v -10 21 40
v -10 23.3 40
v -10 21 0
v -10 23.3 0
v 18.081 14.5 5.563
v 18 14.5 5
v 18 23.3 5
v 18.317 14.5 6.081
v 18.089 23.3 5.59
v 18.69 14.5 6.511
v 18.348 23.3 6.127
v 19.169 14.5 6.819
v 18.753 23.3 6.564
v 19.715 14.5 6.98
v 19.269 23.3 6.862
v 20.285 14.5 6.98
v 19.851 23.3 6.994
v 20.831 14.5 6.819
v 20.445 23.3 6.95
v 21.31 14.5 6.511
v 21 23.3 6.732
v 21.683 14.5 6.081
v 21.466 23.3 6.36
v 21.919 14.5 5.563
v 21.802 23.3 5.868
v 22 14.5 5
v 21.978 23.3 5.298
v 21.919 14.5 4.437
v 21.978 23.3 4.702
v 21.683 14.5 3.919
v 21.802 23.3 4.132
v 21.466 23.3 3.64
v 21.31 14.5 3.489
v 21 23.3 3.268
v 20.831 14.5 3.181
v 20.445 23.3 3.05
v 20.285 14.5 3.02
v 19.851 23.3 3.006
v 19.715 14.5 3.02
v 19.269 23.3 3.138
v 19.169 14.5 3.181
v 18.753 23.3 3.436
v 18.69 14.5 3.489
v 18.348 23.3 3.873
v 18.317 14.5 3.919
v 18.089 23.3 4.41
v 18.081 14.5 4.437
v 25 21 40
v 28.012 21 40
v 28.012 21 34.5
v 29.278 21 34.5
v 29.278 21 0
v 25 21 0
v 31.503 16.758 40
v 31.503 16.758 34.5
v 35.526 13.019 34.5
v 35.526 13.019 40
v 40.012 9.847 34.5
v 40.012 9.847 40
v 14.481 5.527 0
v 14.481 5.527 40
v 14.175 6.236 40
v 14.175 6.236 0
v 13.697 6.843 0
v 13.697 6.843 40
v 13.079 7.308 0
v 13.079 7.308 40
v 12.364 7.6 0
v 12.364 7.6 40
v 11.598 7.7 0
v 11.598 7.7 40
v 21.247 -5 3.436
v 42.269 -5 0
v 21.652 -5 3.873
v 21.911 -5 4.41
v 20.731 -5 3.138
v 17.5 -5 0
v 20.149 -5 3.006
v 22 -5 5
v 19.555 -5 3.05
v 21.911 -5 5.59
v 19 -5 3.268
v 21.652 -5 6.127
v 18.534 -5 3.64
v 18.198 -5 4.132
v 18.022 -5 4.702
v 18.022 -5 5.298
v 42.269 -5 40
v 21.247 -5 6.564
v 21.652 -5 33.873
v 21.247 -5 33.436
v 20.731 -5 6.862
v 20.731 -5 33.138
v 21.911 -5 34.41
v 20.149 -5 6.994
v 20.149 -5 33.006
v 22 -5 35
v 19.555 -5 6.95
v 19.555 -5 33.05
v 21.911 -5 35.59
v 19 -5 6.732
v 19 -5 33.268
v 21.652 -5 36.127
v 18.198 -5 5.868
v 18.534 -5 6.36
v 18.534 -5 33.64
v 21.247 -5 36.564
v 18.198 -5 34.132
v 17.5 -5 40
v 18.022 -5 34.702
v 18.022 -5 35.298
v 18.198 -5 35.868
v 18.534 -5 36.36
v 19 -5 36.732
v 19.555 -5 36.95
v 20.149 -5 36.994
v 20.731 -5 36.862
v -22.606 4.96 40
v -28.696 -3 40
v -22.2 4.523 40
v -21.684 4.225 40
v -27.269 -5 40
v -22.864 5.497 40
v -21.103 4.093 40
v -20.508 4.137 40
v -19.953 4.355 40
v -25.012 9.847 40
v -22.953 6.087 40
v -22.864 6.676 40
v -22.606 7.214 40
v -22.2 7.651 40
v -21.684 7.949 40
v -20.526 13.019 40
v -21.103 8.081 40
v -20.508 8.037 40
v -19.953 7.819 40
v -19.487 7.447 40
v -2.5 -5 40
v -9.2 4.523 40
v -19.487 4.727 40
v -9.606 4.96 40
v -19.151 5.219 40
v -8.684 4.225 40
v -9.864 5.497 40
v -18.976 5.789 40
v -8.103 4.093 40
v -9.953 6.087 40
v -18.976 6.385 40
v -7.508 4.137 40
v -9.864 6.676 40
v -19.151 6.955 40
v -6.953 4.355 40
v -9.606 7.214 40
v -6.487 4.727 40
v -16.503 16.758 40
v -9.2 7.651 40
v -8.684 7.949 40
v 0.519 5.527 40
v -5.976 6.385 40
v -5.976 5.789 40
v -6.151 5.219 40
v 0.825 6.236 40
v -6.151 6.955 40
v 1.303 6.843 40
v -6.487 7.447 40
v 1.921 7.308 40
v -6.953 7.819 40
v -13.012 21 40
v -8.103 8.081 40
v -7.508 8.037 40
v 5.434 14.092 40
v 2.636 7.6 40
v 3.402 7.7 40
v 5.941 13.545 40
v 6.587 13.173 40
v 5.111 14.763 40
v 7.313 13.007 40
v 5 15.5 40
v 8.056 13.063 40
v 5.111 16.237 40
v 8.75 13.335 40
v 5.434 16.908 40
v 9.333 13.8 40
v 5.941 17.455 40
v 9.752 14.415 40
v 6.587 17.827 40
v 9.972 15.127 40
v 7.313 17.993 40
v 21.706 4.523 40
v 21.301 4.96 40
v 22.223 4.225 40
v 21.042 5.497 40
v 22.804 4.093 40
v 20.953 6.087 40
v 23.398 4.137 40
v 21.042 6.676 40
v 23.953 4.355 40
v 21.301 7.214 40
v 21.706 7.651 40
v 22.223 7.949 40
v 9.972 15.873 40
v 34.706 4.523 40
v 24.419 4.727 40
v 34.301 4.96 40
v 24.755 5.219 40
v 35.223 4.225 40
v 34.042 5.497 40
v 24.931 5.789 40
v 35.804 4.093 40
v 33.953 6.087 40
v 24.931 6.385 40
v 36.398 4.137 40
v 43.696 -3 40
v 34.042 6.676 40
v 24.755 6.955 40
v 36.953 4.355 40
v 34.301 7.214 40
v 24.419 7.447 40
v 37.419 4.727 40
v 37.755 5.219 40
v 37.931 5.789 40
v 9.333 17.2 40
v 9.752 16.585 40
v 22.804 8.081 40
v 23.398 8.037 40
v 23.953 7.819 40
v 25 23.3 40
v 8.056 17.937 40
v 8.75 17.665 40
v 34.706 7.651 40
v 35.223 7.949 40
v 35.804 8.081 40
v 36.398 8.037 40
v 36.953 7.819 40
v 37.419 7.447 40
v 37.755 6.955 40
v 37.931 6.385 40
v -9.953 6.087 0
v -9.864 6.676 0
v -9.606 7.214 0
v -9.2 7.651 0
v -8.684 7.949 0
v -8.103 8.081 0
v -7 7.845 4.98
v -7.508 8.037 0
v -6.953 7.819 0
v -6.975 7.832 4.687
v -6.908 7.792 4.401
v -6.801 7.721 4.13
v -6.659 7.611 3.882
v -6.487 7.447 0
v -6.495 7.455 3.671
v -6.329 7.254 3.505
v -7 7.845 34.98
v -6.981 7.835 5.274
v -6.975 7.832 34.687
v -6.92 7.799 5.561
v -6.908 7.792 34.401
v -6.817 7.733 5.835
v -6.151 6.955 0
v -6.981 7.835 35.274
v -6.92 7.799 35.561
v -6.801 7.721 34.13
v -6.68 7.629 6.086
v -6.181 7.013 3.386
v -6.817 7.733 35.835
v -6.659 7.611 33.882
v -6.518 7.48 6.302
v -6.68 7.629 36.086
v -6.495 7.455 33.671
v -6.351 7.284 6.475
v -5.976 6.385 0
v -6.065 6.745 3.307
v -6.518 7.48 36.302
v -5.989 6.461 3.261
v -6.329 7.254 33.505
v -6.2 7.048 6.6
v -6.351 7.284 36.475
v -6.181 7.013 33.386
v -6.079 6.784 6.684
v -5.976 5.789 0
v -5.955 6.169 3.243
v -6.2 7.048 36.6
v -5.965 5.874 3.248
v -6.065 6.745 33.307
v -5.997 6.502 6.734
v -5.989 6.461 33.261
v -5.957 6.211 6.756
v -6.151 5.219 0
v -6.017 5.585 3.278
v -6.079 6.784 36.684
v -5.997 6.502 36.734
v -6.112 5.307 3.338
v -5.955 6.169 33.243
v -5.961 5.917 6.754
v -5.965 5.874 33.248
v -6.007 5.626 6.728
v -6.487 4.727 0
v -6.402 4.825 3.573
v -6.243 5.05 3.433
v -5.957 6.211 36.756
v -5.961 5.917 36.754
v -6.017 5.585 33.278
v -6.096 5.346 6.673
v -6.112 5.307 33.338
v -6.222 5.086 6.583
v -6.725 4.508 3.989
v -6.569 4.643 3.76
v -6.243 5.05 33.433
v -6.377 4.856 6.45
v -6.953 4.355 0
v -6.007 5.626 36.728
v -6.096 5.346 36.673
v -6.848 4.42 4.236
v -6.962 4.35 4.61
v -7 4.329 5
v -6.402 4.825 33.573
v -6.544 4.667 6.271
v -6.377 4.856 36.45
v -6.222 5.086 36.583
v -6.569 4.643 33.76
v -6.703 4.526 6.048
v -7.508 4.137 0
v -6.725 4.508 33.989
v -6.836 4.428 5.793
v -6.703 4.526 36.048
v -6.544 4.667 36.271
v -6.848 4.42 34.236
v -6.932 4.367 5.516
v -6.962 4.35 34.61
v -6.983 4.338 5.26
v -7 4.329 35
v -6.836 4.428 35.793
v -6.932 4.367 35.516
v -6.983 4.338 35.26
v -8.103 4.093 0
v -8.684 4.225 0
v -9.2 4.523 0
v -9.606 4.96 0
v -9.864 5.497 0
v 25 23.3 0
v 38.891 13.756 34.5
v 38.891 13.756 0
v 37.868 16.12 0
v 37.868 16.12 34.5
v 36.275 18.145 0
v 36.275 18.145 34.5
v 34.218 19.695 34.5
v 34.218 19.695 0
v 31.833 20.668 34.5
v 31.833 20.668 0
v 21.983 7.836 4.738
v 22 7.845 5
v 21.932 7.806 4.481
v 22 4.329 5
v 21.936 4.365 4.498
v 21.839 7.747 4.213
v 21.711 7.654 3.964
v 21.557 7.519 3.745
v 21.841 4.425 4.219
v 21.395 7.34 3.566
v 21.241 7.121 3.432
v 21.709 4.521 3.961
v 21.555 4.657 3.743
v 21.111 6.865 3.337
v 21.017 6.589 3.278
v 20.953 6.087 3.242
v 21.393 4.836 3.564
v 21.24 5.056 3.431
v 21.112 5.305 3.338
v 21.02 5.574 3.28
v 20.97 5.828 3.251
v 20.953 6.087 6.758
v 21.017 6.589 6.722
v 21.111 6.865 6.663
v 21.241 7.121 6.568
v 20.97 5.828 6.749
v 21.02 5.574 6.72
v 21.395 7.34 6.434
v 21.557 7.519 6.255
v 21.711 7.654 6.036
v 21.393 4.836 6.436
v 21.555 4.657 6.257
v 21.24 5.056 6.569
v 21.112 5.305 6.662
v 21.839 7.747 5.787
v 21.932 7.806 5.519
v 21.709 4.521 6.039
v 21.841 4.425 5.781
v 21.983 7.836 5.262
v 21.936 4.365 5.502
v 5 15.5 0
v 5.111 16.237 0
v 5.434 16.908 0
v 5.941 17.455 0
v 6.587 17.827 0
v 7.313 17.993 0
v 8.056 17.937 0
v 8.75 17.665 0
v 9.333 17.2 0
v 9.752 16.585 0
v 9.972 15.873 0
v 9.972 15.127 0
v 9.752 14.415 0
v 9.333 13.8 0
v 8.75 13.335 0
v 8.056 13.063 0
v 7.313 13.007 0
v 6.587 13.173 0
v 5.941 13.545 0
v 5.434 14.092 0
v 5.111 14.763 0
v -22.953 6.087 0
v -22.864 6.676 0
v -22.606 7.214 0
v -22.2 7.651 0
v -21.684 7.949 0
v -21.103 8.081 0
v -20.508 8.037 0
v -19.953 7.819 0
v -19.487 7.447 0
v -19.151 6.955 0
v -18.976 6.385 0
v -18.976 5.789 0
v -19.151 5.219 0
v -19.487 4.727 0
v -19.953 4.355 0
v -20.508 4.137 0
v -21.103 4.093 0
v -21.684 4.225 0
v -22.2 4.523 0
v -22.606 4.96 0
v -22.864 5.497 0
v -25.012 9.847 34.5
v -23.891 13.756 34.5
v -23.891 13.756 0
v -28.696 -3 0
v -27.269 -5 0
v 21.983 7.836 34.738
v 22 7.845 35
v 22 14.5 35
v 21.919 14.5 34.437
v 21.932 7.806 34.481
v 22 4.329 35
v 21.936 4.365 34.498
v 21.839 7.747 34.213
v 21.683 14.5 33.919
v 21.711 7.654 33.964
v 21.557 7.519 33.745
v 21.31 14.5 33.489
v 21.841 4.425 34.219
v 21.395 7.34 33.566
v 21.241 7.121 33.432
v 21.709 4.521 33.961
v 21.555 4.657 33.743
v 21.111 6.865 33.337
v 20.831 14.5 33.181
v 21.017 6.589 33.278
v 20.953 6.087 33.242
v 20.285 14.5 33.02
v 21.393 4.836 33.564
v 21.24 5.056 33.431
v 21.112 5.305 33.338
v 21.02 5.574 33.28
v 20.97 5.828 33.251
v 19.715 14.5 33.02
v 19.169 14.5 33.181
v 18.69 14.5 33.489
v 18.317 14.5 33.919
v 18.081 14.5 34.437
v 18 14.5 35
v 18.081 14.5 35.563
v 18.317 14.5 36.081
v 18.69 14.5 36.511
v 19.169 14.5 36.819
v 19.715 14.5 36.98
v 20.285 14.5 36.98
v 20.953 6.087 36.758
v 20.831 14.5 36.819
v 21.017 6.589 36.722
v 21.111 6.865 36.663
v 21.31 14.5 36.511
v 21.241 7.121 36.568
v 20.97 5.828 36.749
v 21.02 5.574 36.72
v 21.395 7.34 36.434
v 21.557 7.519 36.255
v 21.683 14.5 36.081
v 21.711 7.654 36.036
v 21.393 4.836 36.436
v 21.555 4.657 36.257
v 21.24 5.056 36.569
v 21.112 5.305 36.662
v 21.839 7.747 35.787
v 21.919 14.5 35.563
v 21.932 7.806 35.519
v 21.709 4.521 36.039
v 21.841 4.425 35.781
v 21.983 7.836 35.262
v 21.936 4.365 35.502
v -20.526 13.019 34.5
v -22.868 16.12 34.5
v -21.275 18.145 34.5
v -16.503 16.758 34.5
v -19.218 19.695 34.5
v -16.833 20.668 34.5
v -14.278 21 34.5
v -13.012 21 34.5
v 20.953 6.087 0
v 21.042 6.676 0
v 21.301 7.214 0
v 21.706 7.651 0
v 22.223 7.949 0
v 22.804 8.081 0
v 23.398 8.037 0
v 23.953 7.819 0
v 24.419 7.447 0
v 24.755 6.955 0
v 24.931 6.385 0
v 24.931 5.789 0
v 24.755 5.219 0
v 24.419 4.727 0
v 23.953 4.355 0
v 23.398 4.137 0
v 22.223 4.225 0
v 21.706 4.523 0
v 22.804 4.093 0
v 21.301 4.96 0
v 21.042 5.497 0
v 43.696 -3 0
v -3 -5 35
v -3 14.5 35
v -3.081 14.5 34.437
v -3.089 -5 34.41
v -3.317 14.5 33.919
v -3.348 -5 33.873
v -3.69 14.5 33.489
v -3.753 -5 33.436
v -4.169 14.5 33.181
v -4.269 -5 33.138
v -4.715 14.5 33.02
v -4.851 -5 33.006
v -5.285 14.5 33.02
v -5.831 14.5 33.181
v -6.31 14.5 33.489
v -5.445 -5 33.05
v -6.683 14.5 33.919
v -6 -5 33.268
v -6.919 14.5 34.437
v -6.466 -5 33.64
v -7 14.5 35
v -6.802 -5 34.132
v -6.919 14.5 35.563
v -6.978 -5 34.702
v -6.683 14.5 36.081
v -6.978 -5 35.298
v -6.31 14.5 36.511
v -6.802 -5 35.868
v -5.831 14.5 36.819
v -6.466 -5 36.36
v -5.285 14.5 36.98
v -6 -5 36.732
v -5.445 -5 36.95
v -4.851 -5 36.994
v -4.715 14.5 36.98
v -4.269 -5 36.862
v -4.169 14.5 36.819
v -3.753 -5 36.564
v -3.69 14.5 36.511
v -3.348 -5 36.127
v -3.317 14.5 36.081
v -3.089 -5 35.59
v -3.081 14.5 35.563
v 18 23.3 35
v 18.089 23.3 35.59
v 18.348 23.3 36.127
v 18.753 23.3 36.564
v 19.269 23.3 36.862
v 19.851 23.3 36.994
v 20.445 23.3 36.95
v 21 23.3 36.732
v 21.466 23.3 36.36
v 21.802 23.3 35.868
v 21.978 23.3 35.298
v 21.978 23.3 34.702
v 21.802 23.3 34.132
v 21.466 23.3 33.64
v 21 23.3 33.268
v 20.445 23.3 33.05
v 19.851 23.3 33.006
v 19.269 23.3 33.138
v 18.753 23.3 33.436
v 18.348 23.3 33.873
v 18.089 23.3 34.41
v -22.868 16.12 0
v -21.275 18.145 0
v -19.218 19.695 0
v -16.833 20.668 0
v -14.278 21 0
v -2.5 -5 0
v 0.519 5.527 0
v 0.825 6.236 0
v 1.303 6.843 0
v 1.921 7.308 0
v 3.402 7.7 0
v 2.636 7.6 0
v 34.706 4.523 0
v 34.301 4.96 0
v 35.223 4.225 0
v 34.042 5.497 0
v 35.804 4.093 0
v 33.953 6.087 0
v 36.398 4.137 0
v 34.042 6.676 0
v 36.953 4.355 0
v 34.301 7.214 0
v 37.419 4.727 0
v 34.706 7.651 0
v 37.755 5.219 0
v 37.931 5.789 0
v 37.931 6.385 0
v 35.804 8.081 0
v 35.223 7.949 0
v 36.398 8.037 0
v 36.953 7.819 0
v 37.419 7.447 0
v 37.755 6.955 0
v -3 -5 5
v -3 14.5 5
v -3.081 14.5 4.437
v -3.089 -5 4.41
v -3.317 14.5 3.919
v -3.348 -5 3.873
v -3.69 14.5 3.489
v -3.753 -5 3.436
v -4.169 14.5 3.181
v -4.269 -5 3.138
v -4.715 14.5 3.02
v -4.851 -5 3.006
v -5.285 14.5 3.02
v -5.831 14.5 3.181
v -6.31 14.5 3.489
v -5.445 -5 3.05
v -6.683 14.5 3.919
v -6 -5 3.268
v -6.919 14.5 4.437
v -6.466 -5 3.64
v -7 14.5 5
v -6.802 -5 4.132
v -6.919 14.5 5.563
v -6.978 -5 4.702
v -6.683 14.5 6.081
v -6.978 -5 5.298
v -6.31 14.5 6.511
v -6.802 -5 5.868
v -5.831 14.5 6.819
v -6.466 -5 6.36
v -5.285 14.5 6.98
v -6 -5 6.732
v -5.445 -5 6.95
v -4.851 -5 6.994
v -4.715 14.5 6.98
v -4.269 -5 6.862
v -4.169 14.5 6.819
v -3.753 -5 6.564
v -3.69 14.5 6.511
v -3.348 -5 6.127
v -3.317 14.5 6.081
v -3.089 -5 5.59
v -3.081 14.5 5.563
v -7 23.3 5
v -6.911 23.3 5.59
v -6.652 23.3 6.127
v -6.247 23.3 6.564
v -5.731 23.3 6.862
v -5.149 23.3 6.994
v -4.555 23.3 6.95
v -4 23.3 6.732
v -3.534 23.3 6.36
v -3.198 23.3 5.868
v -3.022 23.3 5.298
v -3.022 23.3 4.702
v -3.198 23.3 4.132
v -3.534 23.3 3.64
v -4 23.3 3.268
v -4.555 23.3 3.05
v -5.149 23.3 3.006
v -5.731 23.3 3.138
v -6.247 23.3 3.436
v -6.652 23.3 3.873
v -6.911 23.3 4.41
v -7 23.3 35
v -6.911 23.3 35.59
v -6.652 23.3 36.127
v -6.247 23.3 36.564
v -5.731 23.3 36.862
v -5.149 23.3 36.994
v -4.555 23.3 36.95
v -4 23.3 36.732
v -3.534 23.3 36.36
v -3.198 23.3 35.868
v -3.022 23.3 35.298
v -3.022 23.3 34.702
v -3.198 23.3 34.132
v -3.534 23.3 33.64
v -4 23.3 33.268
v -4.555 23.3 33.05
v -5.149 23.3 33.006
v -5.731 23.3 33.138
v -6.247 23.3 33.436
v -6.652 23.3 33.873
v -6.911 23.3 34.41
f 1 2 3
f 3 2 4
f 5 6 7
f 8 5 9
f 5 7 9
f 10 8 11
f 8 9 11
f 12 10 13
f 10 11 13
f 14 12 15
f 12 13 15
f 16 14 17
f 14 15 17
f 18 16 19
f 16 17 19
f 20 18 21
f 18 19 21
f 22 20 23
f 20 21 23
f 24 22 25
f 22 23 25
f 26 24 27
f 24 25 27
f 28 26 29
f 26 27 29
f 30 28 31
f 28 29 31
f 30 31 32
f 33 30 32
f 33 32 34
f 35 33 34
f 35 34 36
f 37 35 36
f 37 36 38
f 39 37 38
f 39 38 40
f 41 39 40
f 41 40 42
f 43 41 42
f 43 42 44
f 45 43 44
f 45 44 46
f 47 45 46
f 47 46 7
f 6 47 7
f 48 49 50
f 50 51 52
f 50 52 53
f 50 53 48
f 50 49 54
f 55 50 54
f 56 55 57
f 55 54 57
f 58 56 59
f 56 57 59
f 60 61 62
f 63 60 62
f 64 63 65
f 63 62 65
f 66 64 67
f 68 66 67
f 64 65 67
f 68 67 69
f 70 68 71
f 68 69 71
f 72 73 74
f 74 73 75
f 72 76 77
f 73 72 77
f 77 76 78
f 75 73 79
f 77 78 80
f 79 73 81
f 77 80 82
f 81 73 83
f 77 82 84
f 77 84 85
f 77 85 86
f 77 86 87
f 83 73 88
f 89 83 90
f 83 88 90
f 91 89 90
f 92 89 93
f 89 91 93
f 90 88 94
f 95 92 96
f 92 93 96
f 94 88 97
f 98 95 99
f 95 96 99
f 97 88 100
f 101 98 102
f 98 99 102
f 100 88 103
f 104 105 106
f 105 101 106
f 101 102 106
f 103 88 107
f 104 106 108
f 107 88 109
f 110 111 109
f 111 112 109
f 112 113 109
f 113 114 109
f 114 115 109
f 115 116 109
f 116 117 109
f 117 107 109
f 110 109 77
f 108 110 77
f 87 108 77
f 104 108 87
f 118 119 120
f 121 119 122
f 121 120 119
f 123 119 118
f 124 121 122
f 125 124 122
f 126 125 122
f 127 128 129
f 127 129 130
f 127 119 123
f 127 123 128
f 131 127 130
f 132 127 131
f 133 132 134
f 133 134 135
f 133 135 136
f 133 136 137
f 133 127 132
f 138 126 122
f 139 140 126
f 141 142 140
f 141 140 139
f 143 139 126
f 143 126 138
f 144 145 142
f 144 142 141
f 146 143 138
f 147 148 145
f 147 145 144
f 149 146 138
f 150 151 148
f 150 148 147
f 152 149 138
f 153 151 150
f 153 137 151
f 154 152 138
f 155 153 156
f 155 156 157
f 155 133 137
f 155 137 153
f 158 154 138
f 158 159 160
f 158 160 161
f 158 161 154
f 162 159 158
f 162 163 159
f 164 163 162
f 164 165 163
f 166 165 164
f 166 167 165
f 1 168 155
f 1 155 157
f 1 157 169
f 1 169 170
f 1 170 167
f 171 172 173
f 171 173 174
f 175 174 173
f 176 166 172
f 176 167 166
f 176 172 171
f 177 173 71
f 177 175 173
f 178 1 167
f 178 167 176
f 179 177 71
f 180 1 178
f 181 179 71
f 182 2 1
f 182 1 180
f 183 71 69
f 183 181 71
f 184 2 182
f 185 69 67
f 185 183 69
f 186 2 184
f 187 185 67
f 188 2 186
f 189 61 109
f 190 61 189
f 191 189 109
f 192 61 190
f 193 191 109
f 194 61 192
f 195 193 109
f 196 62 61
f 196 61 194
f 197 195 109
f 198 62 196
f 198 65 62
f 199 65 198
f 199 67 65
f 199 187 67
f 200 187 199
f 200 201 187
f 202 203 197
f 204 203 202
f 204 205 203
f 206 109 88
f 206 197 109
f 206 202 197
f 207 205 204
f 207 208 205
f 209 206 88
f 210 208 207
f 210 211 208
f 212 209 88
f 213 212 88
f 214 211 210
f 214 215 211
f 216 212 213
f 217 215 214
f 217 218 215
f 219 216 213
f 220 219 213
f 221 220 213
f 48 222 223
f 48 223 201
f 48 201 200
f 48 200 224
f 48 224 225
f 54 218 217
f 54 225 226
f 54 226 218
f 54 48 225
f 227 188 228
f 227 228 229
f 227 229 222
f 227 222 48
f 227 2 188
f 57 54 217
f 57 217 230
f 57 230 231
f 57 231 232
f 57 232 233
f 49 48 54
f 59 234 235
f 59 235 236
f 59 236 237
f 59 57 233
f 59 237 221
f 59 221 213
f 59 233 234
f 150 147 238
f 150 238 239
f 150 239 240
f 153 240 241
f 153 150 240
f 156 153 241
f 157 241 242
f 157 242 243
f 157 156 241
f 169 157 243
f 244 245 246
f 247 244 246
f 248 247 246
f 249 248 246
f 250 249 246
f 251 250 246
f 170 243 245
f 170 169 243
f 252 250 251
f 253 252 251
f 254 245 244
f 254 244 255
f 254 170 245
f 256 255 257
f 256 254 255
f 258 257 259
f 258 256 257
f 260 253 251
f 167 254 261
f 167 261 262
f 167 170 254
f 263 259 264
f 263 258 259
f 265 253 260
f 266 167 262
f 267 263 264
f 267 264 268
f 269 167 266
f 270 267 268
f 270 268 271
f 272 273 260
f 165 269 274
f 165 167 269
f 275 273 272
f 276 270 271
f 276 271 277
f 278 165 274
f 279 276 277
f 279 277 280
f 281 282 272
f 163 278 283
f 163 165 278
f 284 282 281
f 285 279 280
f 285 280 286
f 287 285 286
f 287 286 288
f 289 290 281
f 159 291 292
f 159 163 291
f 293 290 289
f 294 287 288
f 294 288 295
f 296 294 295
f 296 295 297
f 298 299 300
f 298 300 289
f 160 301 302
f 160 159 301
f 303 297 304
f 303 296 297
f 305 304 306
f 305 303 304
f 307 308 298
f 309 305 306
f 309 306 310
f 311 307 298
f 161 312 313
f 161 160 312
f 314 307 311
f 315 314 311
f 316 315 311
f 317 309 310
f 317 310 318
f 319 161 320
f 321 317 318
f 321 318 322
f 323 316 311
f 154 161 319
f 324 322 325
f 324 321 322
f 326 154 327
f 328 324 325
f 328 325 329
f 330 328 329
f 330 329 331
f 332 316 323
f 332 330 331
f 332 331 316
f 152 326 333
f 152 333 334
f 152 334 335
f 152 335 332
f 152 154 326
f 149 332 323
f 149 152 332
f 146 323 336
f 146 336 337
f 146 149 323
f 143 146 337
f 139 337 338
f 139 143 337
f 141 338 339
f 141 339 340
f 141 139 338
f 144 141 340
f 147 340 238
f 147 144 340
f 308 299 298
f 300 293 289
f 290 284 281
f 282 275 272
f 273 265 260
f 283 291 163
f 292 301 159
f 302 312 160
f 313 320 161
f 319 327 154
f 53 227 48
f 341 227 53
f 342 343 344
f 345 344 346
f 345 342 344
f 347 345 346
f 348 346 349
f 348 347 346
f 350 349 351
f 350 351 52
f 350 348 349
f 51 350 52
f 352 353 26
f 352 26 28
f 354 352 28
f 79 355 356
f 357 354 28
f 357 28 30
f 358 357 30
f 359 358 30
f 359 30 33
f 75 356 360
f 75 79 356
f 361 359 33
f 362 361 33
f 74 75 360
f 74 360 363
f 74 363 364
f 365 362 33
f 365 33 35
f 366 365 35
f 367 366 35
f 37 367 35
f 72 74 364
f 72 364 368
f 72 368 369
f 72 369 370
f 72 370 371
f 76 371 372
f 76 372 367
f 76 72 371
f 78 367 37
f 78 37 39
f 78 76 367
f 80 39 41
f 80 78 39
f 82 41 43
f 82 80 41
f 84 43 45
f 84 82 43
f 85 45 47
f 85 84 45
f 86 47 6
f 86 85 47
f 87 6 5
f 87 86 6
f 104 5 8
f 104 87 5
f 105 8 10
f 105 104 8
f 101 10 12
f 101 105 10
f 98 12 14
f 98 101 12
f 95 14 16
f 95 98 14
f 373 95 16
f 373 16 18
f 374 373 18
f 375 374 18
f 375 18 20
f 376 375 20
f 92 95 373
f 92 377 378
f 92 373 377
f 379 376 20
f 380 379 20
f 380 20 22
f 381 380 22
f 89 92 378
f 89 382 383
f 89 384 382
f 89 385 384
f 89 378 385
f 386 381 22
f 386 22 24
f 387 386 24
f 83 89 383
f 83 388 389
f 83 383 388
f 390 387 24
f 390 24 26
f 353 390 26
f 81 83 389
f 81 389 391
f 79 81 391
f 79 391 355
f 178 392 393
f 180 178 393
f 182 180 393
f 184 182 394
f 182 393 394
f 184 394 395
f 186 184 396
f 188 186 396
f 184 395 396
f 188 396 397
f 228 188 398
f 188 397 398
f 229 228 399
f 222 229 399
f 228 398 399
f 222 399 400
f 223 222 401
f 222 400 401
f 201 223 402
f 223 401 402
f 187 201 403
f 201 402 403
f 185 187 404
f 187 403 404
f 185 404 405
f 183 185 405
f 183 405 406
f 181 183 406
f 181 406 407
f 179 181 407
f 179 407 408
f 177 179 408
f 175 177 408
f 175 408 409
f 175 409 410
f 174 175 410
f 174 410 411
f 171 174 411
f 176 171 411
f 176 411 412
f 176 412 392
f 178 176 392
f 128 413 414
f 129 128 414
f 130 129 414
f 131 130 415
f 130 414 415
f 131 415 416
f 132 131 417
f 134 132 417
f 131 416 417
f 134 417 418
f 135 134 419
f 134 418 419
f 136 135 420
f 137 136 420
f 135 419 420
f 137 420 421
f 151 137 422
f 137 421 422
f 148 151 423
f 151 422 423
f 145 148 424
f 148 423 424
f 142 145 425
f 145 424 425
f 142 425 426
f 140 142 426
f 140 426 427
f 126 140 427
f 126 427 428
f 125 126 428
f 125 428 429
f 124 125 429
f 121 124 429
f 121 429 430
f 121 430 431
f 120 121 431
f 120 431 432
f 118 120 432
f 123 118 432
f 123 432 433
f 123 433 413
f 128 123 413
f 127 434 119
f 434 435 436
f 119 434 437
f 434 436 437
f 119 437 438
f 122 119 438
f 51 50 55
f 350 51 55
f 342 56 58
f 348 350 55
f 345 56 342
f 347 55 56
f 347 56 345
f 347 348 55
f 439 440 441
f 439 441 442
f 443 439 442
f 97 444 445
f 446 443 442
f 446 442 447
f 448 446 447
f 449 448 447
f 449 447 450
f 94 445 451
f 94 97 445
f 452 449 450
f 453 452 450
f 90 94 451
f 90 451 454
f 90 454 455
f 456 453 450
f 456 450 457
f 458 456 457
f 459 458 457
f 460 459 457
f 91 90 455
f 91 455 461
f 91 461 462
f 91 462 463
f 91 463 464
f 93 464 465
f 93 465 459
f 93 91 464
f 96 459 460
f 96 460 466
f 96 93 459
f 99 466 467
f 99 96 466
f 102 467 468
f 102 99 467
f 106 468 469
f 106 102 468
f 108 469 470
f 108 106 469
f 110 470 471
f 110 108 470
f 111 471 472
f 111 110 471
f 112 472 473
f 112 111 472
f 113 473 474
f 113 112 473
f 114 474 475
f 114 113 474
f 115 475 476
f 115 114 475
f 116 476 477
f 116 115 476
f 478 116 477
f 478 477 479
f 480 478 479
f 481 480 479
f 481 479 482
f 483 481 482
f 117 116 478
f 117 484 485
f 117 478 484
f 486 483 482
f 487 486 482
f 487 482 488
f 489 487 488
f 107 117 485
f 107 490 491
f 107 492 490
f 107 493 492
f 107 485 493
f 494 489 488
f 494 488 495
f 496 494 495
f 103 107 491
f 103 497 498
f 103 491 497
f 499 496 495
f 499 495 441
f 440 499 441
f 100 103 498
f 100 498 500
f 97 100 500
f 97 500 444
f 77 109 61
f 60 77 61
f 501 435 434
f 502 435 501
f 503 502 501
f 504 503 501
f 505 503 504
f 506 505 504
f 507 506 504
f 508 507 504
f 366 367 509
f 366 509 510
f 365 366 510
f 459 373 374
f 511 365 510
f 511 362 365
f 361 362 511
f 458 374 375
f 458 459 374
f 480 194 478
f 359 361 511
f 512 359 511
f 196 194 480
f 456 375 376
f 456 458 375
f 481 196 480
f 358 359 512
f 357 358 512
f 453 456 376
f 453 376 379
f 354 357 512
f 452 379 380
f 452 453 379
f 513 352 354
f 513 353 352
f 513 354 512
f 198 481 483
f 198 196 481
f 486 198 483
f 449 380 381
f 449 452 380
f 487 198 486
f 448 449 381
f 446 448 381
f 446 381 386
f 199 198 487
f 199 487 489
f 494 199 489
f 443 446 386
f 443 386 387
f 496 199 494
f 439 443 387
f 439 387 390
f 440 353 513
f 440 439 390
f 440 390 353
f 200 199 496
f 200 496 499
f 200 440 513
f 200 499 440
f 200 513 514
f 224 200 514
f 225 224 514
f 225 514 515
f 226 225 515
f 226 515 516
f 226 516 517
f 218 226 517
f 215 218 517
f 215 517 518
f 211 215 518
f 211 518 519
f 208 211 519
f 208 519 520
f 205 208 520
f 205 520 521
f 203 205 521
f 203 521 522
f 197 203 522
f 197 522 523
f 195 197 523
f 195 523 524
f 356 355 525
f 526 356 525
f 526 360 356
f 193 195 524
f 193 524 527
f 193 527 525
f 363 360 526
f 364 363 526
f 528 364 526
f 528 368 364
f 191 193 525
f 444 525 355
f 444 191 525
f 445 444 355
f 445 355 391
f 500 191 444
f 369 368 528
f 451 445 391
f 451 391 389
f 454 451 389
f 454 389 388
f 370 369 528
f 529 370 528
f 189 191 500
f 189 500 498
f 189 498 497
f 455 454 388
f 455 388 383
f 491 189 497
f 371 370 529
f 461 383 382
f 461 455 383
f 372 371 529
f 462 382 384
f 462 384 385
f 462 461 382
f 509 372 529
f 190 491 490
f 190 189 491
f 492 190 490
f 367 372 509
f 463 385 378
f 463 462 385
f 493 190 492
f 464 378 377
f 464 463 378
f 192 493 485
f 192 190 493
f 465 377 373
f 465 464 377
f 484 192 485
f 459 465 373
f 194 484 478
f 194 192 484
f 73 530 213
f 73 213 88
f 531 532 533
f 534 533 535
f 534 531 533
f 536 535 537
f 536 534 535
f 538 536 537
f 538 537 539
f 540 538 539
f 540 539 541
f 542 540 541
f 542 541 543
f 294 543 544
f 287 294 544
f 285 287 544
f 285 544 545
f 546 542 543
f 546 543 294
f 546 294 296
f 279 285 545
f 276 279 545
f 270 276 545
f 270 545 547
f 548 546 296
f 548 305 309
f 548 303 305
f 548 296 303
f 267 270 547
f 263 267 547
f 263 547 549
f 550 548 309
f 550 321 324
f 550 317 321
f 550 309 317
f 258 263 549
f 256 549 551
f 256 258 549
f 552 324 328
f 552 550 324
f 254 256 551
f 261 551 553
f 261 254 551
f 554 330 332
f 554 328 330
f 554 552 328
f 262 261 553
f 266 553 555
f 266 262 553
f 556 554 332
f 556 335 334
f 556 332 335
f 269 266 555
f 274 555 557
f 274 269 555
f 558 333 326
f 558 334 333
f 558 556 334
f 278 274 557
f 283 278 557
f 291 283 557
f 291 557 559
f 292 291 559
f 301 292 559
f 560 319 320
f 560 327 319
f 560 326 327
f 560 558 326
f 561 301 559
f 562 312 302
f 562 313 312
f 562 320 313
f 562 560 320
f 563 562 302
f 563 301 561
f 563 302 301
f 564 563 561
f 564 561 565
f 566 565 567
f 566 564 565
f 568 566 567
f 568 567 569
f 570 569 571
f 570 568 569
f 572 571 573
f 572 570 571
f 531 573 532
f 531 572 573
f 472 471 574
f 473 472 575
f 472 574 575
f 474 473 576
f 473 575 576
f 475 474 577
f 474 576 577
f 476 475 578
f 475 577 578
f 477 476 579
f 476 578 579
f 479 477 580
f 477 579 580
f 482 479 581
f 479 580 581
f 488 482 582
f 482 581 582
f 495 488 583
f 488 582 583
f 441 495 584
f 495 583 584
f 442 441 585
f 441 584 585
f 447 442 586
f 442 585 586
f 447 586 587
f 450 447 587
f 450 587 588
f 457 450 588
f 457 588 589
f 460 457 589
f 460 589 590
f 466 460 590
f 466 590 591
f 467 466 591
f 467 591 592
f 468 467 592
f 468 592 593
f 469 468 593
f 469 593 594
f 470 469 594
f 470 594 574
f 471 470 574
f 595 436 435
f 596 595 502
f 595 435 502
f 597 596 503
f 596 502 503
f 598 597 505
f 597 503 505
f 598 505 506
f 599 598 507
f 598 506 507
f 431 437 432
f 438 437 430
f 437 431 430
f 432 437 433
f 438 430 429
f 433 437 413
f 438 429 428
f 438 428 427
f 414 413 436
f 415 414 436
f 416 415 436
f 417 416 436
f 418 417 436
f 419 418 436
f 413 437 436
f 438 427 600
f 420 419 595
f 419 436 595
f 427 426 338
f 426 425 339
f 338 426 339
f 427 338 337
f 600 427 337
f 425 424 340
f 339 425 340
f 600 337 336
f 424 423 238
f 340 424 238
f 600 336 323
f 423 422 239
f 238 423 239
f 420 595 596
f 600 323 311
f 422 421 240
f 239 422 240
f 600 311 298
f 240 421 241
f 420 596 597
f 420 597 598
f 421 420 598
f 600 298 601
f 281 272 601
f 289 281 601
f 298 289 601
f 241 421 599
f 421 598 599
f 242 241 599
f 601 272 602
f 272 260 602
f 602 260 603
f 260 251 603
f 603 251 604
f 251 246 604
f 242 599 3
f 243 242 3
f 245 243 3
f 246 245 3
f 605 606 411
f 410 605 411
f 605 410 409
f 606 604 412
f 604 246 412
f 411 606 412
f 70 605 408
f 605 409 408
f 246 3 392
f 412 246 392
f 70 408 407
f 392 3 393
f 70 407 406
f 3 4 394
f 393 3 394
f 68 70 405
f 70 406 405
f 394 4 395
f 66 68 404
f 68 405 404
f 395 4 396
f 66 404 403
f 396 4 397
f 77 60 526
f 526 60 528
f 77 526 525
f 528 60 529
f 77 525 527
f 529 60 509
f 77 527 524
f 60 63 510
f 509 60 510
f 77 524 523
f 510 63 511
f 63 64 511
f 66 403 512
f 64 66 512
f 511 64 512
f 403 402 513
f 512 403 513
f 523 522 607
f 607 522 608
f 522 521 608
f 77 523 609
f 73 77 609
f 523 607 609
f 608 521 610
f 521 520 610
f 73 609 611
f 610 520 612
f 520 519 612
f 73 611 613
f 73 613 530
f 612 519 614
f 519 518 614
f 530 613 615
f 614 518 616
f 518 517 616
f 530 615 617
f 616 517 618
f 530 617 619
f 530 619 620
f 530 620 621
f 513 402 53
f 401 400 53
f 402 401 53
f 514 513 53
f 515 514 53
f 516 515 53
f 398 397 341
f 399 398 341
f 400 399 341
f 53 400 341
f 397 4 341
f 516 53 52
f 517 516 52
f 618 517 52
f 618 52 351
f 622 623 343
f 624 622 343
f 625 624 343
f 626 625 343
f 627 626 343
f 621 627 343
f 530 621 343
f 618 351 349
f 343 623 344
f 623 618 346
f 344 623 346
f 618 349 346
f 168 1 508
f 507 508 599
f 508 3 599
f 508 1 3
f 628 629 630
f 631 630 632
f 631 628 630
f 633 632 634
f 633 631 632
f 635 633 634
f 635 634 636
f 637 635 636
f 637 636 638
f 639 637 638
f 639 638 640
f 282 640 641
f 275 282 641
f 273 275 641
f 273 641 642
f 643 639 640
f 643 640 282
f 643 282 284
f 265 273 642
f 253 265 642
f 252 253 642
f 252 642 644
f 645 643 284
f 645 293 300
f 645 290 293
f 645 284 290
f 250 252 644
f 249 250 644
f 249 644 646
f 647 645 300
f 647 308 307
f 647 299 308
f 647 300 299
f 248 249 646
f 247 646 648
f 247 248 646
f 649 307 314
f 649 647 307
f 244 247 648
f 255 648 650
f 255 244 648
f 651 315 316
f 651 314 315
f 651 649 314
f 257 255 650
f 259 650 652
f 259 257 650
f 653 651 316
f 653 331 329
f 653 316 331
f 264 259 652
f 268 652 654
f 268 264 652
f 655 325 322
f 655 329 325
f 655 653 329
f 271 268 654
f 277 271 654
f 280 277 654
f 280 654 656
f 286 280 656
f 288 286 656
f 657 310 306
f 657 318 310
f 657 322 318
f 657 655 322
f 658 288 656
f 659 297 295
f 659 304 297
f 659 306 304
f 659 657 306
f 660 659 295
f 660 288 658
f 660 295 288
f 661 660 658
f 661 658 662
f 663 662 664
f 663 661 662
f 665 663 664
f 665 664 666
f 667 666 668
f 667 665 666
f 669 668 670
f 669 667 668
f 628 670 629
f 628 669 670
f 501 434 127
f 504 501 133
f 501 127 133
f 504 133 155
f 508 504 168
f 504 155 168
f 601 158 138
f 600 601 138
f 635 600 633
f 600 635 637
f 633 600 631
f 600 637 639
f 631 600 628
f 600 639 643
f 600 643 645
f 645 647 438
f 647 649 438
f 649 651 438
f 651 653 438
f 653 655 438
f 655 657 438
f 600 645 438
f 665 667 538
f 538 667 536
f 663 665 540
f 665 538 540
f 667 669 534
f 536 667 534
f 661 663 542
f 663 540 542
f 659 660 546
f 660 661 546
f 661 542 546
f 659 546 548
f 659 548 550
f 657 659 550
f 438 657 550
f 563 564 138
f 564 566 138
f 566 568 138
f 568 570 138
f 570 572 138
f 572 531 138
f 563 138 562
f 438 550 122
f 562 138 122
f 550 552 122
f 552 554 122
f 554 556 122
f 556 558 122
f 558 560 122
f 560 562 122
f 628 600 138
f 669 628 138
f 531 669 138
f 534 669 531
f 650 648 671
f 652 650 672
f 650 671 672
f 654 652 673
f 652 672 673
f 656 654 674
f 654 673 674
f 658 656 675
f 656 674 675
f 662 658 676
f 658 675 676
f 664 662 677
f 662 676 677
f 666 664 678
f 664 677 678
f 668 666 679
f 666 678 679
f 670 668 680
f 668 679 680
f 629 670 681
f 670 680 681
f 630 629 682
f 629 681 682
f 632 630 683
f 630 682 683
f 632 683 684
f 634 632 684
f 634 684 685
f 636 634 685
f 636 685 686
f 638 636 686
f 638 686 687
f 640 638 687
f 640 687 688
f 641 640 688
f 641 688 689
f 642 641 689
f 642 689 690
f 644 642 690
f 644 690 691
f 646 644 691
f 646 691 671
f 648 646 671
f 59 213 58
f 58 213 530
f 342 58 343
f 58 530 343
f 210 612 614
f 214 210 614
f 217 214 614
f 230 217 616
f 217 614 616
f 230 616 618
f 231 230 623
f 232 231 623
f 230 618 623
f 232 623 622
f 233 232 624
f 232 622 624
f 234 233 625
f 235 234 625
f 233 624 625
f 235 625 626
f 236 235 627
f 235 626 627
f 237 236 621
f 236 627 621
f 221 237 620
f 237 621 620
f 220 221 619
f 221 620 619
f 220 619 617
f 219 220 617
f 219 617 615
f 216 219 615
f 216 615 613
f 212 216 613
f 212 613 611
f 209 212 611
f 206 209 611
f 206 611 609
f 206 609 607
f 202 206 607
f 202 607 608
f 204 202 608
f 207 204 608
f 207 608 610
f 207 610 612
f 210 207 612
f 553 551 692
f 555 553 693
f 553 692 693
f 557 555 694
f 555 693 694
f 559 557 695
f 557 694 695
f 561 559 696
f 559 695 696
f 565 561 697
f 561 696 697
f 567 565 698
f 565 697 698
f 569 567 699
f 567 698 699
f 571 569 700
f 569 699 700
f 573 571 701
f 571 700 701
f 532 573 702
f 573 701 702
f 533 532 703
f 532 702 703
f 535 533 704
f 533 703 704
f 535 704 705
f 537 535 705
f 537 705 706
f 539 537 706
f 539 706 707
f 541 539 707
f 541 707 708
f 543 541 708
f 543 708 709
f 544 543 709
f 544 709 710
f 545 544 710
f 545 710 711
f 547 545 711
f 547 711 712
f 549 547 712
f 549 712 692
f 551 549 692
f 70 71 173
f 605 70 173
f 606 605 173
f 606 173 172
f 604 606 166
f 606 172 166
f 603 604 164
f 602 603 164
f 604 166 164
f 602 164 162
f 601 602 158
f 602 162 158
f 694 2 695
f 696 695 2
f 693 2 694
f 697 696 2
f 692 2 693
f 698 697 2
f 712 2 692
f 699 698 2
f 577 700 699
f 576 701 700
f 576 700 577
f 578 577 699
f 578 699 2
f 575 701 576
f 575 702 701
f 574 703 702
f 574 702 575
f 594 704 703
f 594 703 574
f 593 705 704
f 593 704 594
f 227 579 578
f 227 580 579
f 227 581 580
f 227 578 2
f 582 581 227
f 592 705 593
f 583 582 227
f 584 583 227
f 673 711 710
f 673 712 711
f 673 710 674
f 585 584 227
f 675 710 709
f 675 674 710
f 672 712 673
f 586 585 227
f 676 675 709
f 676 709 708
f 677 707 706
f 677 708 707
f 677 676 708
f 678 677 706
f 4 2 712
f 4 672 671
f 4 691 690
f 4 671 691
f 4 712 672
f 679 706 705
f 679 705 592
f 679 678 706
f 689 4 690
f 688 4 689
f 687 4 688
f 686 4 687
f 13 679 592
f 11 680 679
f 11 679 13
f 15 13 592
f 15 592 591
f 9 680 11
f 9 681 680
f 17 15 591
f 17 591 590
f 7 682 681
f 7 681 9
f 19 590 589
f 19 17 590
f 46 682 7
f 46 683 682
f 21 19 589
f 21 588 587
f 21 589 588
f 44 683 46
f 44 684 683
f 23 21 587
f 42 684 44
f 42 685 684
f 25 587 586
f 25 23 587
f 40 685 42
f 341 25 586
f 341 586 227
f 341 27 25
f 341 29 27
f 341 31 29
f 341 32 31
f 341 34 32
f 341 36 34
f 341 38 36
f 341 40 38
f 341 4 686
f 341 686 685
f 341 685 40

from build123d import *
from build123d.topology import SkipClean

# Parameters (mm, degrees)
SKETCH_1_R              = 2.4
SKETCH_1_R_2            = 6.5
EXTRUDE_1_DEPTH         = 40
FILLET_1_R              = 10
SKETCH_2_R              = 2.4
CUT_EXTRUDE_1_DEPTH     = 66.0828238
SKETCH_4_R              = 41.2
CUT_EXTRUDE_2_DEPTH     = 5.5
CUT_EXTRUDE_3_DEPTH     = 64.25167155
SKETCH_6_W              = 35.436929204
SKETCH_6_H              = 26
EXTRUDE_2_DEPTH         = 40
CUT_EXTRUDE_4_DEPTH     = 42
EXTRUDE_START           = -40
EXTRUDE_3_DEPTH         = 40
SKETCH_9_R              = 2
CUT_EXTRUDE_5_DEPTH     = 42
SKETCH_13_R             = 2
CUT_EXTRUDE_6_DEPTH     = 10
SKETCH_14_R             = 2
EXTRUDE_4_DEPTH         = 40
EXTRUDE_START_2         = 2.3
SKETCH_15_W             = 35
SKETCH_15_H             = 40
SKETCH_15_R             = 2
EXTRUDE_5_DEPTH         = 2.3
SKETCH_16_R             = 2.5
CUT_EXTRUDE_7_DEPTH     = 62.3
CUT_EXTRUDE_START       = -26
CUT_EXTRUDE_8_OUTLINE_R = 2
CUT_EXTRUDE_8_DEPTH     = 19.5


# Read off the part's stored shape, not the designer's step: 切除-拉伸8
with BuildPart() as part:
    # 草图1 → 凸台-拉伸1 (new body)
    with BuildSketch(Plane.XY):
        Polygon((-29.269334238, -5), (44.269334238, -5), (36.813954208, 21), (-21.813954208, 21), align=None)
        with Locations((15, 17)):
            Circle(SKETCH_1_R, mode=Mode.SUBTRACT)
        with Locations((15, 0)):
            Circle(SKETCH_1_R, mode=Mode.SUBTRACT)
        Circle(SKETCH_1_R, mode=Mode.SUBTRACT)
        with Locations((0, 17)):
            Circle(SKETCH_1_R, mode=Mode.SUBTRACT)
        with Locations((7.5, 8)):
            Circle(SKETCH_1_R_2, mode=Mode.SUBTRACT)
    extrude(amount=EXTRUDE_1_DEPTH)

    # 圆角1
    fillet_1_edges = [part.edges().sort_by_distance(p)[0] for p in [
        (-21.813954208, 21, 20),
        (36.813954208, 21, 20),
    ]]
    fillet(fillet_1_edges, radius=FILLET_1_R)

    # 草图2 → 切除-拉伸1 (cut, through all)
    with BuildSketch(Plane(origin=(0, 21, 0), x_dir=(1, 0, 0), z_dir=(0, 1, 0))):
        with Locations(Location((-5, -5, 0), (0, 0, 180))):
            Circle(SKETCH_2_R)
        with Locations(Location((20, -5, 0), (0, 0, 180))):
            Circle(SKETCH_2_R)
        with Locations(Location((-5, -35, 0), (0, 0, 180))):
            Circle(SKETCH_2_R)
        with Locations(Location((20, -35, 0), (0, 0, 180))):
            Circle(SKETCH_2_R)
    extrude(amount=-CUT_EXTRUDE_1_DEPTH, mode=Mode.SUBTRACT)

    # 草图4 → 切除-拉伸2 (cut)
    with BuildSketch(Plane.XY.offset(40)):
        with Locations((-46.5, 45)):
            Circle(SKETCH_4_R)
        with Locations((61.5, 45)):
            Circle(SKETCH_4_R)
    extrude(amount=-CUT_EXTRUDE_2_DEPTH, mode=Mode.SUBTRACT)

    # 草图5 → 切除-拉伸3 (cut, through all)
    with BuildSketch(Plane(origin=(0, 0, 0), x_dir=(-1, 0, 0), z_dir=(0, 0, -1))):
        Polygon((-42.269334238, -5), (-44.269334238, -5), (-43.695843466, -3), align=None)
        Polygon((28.695843466, -3), (27.269334238, -5), (29.269334238, -5), align=None)
    extrude(amount=-CUT_EXTRUDE_3_DEPTH, mode=Mode.SUBTRACT)

    # 草图6 → 凸台-拉伸2 (add)
    with BuildSketch(Plane.XY.offset(40)):
        with Locations((7.60959875, 8)):
            Rectangle(SKETCH_6_W, SKETCH_6_H)
    extrude(amount=-EXTRUDE_2_DEPTH)

    # 草图7 → 切除-拉伸4 (cut)
    with BuildSketch(Plane.XY.offset(40)):
        with BuildLine():
            Line((-22.507387905, -5), (37.507387905, -5))
            Line((37.507387905, -5), (35.643542897, 1.5))
            Line((35.643542897, 1.5), (34.432453611, 5.723570268))
            Line((34.432453611, 5.723570268), (33.76369363, 8.055813487))
            Line((33.76369363, 8.055813487), (32.642829643, 11.964730745))
            ThreePointArc((32.642829643, 11.964730745), (31.384766288, 13.795224285), (29.278413707, 14.5))
            Line((29.278413707, 14.5), (28.012091734, 14.5))
            Line((28.012091734, 14.5), (24.82521302, 14.5))
            Line((24.82521302, 14.5), (-9.82521302, 14.5))
            Line((-9.82521302, 14.5), (-13.012091734, 14.5))
            Line((-13.012091734, 14.5), (-14.278413707, 14.5))
            ThreePointArc((-14.278413707, 14.5), (-16.384766288, 13.795224285), (-17.642829643, 11.964730745))
            Line((-17.642829643, 11.964730745), (-18.76369363, 8.055813487))
            Line((-18.76369363, 8.055813487), (-19.432453611, 5.723570268))
            Line((-19.432453611, 5.723570268), (-20.643542897, 1.5))
            Line((-20.643542897, 1.5), (-22.507387905, -5))
        make_face()
    extrude(amount=-CUT_EXTRUDE_4_DEPTH, mode=Mode.SUBTRACT)

    # 草图8 → 凸台-拉伸3 (add)
    with BuildSketch(Plane(origin=(0, 0, 0), x_dir=(-1, 0, 0), z_dir=(0, 0, -1)).offset(EXTRUDE_START)):
        with BuildLine():
            Line((-32.642829643, 11.964730745), (-36.218494875, -0.505095833))
            ThreePointArc((-36.218494875, -0.505095833), (-31.672508019, 1.693488789), (-29.830249532, 6.395175135))
            ThreePointArc((-29.830249532, 6.395175135), (-30.573281352, 9.514892934), (-32.642829643, 11.964730745))
        make_face()
        with BuildLine():
            ThreePointArc((17.642829643, 11.964730745), (15.098349227, 4.487546685), (21.218494875, -0.505095833))
            Line((21.218494875, -0.505095833), (17.642829643, 11.964730745))
        make_face()
    extrude(amount=EXTRUDE_3_DEPTH)

    # 草图9 → 切除-拉伸5 (cut)
    with BuildSketch(Plane(origin=(0, 0, 0), x_dir=(-1, 0, 0), z_dir=(0, 0, -1))):
        with Locations((-35.953320593, 6.086964229)):
            Circle(SKETCH_9_R)
        with Locations((20.953320593, 6.086964229)):
            Circle(SKETCH_9_R)
    extrude(amount=-CUT_EXTRUDE_5_DEPTH, mode=Mode.SUBTRACT)

    # 草图13 → 切除-拉伸6 (cut)
    with BuildSketch(Plane(origin=(0, 21, 0), x_dir=(1, 0, 0), z_dir=(0, 1, 0))):
        with Locations(Location((20, -35, 0), (0, 0, 180))):
            Circle(SKETCH_13_R)
        with Locations(Location((-5, -35, 0), (0, 0, 180))):
            Circle(SKETCH_13_R)
        with Locations(Location((-5, -5, 0), (0, 0, 180))):
            Circle(SKETCH_13_R)
        with Locations(Location((20, -5, 0), (0, 0, 180))):
            Circle(SKETCH_13_R)
    extrude(amount=-CUT_EXTRUDE_6_DEPTH, mode=Mode.SUBTRACT)

    # 草图14 → 凸台-拉伸4 (add)
    with BuildSketch(Plane(origin=(0, 0, 0), x_dir=(-1, 0, 0), z_dir=(0, 0, -1)).offset(EXTRUDE_START)):
        with BuildLine():
            Line((-36.218494875, -0.505095833), (-37.507387905, -5))
            Line((-37.507387905, -5), (-17.5, -5))
            Line((-17.5, -5), (-14.481456538, 5.526912067))
            ThreePointArc((-14.481456538, 5.526912067), (-13.40311652, 7.09590653), (-11.597671451, 7.7))
            Line((-11.597671451, 7.7), (-7.5, 7.7))
            Line((-7.5, 7.7), (-3.402328549, 7.7))
            ThreePointArc((-3.402328549, 7.7), (-1.59688348, 7.09590653), (-0.518543462, 5.526912067))
            Line((-0.518543462, 5.526912067), (2.5, -5))
            Line((2.5, -5), (22.507387905, -5))
            Line((22.507387905, -5), (21.218494875, -0.505095833))
            ThreePointArc((21.218494875, -0.505095833), (15.098349227, 4.487546685), (17.642829643, 11.964730745))
            ThreePointArc((17.642829643, 11.964730745), (16.384766288, 13.795224285), (14.278413707, 14.5))
            Line((14.278413707, 14.5), (-29.278413707, 14.5))
            ThreePointArc((-29.278413707, 14.5), (-31.384766288, 13.795224285), (-32.642829643, 11.964730745))
            ThreePointArc((-32.642829643, 11.964730745), (-30.098349227, 4.487546685), (-36.218494875, -0.505095833))
        make_face()
        with Locations((-22.953320593, 6.086964229)):
            Circle(SKETCH_14_R, mode=Mode.SUBTRACT)
        with Locations((7.953320593, 6.086964229)):
            Circle(SKETCH_14_R, mode=Mode.SUBTRACT)
    extrude(amount=EXTRUDE_4_DEPTH)

    # 草图15 → 凸台-拉伸5 (add)
    with BuildSketch(Plane(origin=(0, 21, 0), x_dir=(1, 0, 0), z_dir=(0, 1, 0)).offset(EXTRUDE_START_2)):
        with Locations((7.5, -20)):
            Rectangle(SKETCH_15_W, SKETCH_15_H)
        with Locations(Location((-5, -35, 0), (0, 0, 180))):
            Circle(SKETCH_15_R, mode=Mode.SUBTRACT)
        with Locations(Location((20, -35, 0), (0, 0, 180))):
            Circle(SKETCH_15_R, mode=Mode.SUBTRACT)
        with Locations(Location((-5, -5, 0), (0, 0, 180))):
            Circle(SKETCH_15_R, mode=Mode.SUBTRACT)
        with Locations(Location((20, -5, 0), (0, 0, 180))):
            Circle(SKETCH_15_R, mode=Mode.SUBTRACT)
    extrude(amount=-EXTRUDE_5_DEPTH)

    # 草图16 → 切除-拉伸7 (cut)
    with BuildSketch(Plane(origin=(0, 0, 0), x_dir=(-1, 0, 0), z_dir=(0, 0, -1))):
        with Locations((-7.5, 15.5)):
            Circle(SKETCH_16_R)
    extrude(amount=-CUT_EXTRUDE_7_DEPTH, mode=Mode.SUBTRACT)

    # 切除-拉伸8 outline → 切除-拉伸8 (cut)
    with SkipClean():  # the faces are left unmerged after this step: merging them gives an invalid solid
        with BuildSketch(Plane(origin=(0, 21, 0), x_dir=(1, 0, 0), z_dir=(0, 1, 0)).offset(CUT_EXTRUDE_START)):
            with Locations((-5, -5)):
                Circle(CUT_EXTRUDE_8_OUTLINE_R)
            with Locations((-5, -35)):
                Circle(CUT_EXTRUDE_8_OUTLINE_R)
            with Locations((20, -35)):
                Circle(CUT_EXTRUDE_8_OUTLINE_R)
            with Locations((20, -5)):
                Circle(CUT_EXTRUDE_8_OUTLINE_R)
        extrude(amount=CUT_EXTRUDE_8_DEPTH, mode=Mode.SUBTRACT)


solid = part.part
